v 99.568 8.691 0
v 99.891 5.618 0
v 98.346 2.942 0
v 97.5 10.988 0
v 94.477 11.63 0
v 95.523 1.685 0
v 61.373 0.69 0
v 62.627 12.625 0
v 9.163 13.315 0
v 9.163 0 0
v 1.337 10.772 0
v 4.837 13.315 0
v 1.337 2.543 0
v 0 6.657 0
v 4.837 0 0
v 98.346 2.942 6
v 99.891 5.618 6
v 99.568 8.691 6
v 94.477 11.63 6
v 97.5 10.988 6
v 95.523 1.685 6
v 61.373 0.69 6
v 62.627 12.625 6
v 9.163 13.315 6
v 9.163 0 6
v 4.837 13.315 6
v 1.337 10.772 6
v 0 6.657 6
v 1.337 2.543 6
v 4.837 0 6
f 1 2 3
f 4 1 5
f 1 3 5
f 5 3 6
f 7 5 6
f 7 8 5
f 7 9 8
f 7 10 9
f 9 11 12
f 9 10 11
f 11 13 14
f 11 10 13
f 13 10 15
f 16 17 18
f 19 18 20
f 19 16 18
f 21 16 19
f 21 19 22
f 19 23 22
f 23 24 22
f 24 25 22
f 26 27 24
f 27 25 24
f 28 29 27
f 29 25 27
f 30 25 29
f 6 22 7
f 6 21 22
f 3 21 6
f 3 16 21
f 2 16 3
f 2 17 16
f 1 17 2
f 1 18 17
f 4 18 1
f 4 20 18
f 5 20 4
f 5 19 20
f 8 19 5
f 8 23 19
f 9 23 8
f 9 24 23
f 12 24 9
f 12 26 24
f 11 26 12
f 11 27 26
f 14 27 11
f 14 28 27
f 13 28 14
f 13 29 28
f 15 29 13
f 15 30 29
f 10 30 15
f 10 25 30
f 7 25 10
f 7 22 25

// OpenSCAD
$fn = 32;

// ----------------------------------------------------------------------
// Lever arm: two bosses 14 and 12 mm, 55 mm between centres
// ----------------------------------------------------------------------

// --- parameters (mm) ---
profile_height = 6;       // extrusion height
profile_points = 15;      // points of the closed outline

profile = [[0, 6.657], [1.337, 2.543], [4.837, 0], [9.163, 0], [61.373, 0.69], [95.523, 1.685], [98.346, 2.942], [99.891, 5.618], [99.568, 8.691], [97.5, 10.988], [94.477, 11.63], [62.627, 12.625], [9.163, 13.315], [4.837, 13.315], [1.337, 10.772]];  // single closed polygon, 15 points, counter clockwise

// --- the one profile operation ---
linear_extrude(height = profile_height) polygon(points = profile);
